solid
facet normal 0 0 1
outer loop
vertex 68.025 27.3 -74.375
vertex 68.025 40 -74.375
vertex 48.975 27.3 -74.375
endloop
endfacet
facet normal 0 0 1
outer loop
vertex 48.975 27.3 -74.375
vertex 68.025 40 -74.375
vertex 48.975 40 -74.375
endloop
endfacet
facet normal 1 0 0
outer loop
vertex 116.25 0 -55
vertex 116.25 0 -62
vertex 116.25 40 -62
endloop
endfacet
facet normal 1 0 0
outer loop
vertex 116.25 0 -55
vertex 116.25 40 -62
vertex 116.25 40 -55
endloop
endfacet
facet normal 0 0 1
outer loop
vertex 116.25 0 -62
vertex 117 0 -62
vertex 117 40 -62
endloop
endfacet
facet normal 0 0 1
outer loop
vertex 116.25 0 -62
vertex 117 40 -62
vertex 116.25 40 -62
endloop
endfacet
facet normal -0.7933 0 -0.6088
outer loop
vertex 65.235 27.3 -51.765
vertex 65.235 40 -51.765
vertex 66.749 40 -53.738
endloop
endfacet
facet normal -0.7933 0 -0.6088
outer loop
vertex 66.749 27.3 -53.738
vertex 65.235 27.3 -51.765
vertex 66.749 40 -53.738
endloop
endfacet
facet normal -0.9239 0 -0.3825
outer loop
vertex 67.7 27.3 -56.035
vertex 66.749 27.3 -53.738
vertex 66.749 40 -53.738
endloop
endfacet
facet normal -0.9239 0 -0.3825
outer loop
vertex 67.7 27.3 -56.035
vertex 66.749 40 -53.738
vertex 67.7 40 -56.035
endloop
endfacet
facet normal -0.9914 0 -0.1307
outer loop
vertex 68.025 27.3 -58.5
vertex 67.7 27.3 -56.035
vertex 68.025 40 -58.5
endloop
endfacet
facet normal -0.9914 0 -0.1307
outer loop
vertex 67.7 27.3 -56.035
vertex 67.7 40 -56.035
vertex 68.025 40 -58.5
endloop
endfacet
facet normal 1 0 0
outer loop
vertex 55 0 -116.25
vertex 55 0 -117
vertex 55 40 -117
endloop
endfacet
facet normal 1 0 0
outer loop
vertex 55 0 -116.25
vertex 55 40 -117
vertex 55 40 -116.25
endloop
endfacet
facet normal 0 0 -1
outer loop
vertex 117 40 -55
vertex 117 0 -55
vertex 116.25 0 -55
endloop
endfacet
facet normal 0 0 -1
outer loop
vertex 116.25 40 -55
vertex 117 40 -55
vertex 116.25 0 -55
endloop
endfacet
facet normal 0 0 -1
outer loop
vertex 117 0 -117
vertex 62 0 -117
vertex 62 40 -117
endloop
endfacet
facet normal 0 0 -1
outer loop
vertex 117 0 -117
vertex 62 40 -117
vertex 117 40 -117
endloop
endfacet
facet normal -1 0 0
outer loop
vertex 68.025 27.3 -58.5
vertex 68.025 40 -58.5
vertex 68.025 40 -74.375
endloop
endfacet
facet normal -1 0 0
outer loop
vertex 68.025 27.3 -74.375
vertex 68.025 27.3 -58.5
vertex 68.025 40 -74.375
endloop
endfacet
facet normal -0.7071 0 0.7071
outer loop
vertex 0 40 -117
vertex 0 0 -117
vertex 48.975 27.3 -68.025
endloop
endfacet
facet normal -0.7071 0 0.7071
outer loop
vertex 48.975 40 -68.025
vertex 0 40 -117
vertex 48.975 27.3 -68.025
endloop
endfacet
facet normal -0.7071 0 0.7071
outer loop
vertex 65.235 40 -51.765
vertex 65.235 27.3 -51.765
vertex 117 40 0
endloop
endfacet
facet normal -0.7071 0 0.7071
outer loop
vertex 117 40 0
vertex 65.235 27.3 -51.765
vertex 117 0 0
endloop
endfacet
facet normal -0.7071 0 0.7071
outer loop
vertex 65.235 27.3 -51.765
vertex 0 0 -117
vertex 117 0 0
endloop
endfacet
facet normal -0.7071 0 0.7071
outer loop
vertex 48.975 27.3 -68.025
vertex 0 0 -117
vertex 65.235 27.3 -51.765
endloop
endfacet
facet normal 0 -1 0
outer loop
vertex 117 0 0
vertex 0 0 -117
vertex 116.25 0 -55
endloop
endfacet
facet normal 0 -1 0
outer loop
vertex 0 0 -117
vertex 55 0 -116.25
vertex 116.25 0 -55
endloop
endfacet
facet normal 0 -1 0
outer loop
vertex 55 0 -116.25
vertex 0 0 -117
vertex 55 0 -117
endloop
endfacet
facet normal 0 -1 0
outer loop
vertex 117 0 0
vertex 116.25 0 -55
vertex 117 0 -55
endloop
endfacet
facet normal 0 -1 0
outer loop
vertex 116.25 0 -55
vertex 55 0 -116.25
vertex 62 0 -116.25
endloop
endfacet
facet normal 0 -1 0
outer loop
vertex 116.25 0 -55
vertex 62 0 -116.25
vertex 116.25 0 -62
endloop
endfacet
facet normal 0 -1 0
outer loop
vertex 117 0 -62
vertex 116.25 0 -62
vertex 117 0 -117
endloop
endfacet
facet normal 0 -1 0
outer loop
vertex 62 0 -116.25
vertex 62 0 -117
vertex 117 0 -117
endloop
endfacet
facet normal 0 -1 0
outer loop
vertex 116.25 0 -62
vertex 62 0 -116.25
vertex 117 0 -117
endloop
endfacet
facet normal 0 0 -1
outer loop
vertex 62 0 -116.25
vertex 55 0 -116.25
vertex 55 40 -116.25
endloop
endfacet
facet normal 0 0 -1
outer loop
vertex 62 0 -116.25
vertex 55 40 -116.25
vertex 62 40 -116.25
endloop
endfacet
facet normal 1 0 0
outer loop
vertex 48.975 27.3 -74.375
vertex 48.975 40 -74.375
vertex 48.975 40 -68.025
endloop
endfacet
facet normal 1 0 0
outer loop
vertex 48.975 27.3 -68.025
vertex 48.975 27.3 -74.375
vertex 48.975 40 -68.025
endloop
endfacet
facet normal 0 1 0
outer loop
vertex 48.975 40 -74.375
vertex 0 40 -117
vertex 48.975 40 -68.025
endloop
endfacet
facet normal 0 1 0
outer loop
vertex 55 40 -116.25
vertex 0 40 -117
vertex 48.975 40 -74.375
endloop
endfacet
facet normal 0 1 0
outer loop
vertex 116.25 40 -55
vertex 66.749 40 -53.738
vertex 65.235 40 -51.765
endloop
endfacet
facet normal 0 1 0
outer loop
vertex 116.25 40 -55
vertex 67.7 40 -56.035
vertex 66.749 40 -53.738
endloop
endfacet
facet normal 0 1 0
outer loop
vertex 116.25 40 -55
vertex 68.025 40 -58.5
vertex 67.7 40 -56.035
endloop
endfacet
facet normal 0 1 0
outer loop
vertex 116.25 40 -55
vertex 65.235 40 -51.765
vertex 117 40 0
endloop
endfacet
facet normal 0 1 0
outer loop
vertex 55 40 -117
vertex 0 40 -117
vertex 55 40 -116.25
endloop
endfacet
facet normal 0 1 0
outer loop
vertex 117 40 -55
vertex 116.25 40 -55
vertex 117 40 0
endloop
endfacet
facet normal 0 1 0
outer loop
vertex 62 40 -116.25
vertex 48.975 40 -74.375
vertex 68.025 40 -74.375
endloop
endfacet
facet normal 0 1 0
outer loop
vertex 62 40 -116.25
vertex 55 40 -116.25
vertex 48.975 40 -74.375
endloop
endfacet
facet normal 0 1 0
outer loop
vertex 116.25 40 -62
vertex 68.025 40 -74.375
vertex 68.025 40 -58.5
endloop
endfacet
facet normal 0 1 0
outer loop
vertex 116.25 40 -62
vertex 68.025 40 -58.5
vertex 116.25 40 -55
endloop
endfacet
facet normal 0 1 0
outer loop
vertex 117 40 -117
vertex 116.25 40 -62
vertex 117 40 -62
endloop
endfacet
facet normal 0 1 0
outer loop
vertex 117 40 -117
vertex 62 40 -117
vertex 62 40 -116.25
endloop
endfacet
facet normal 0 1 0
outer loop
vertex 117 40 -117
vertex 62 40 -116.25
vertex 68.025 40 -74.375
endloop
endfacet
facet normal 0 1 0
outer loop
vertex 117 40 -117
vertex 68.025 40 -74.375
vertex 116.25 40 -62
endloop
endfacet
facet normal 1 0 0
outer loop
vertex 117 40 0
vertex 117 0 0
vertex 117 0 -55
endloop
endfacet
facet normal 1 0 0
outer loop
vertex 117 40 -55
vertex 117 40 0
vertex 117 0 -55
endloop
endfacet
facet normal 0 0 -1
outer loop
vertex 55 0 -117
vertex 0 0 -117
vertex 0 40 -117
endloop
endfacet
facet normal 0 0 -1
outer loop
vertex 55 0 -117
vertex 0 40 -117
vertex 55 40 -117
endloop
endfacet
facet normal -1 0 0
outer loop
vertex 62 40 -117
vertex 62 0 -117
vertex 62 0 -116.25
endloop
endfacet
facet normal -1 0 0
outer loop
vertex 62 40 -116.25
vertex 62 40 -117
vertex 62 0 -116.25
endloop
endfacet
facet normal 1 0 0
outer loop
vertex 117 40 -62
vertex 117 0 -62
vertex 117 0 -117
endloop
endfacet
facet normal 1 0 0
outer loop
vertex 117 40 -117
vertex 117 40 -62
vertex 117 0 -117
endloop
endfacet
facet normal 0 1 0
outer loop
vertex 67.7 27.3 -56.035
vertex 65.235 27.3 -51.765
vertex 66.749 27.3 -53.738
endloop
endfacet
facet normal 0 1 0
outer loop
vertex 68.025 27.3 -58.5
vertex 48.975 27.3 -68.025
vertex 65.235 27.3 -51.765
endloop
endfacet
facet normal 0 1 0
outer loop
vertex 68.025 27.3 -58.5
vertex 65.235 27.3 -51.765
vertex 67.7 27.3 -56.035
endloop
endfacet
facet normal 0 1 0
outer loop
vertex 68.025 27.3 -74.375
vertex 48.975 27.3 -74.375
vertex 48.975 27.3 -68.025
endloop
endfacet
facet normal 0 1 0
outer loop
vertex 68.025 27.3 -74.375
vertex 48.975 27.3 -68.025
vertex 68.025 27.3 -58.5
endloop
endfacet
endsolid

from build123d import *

# Parameters (mm, degrees)
SKETCH1_W           = 117
SKETCH1_H           = 117
BOSS_EXTRUDE1_DEPTH = 40
SKETCH2_W           = 10.53028371
SKETCH2_H           = 7.9375
CUT_EXTRUDE1_DEPTH  = 12.7
SKETCH7_W           = 7
SKETCH7_H           = 1.5
CUT_EXTRUDE5_DEPTH  = 171.22925718
CIRPATTERN3_COUNT   = 3
CIRPATTERN3_ANGLE   = 180
CUT_EXTRUDE12_DEPTH = 171.22925718


with BuildPart() as part:
    # Sketch1 → Boss-Extrude1 (new body)
    with BuildSketch(Plane(origin=(0, 0, 0), x_dir=(1, 0, 0), z_dir=(0, 1, 0))):
        with Locations((58.5, 58.5)):
            Rectangle(SKETCH1_W, SKETCH1_H)
    extrude(amount=BOSS_EXTRUDE1_DEPTH)

    # Sketch2 → Cut-Extrude1 (cut)
    with BuildSketch(Plane(origin=(0, 40, 0), x_dir=(1, 0, 0), z_dir=(0, 1, 0))):
        with BuildLine():
            ThreePointArc((63.765141855, 66.4375), (66.892737967, 63.004173), (68.025, 58.5))
            Line((68.025, 58.5), (68.025, 74.375))
            Line((68.025, 74.375), (48.975, 74.375))
            Line((48.975, 74.375), (48.975, 58.5))
            ThreePointArc((48.975, 58.5), (50.107262033, 63.004173), (53.234858145, 66.4375))
            ThreePointArc((53.234858145, 66.4375), (58.5, 68.025), (63.765141855, 66.4375))
        make_face()
        with BuildLine():
            ThreePointArc((63.765141855, 50.5625), (66.892737967, 53.995827), (68.025, 58.5))
            Line((68.025, 58.5), (63.765141855, 58.5))
            Line((63.765141855, 58.5), (63.765141855, 50.5625))
        make_face()
        with BuildLine():
            Line((63.765141855, 58.5), (68.025, 58.5))
            ThreePointArc((68.025, 58.5), (66.892737967, 63.004173), (63.765141855, 66.4375))
            Line((63.765141855, 66.4375), (63.765141855, 58.5))
        make_face()
        with BuildLine():
            Line((53.234858145, 50.5625), (53.234858145, 58.5))
            Line((53.234858145, 58.5), (48.975, 58.5))
            ThreePointArc((48.975, 58.5), (50.107262033, 53.995827), (53.234858145, 50.5625))
        make_face()
        with BuildLine():
            Line((48.975, 58.5), (53.234858145, 58.5))
            Line((53.234858145, 58.5), (53.234858145, 66.4375))
            ThreePointArc((53.234858145, 66.4375), (50.107262033, 63.004173), (48.975, 58.5))
        make_face()
        with Locations((58.5, 62.46875)):
            Rectangle(SKETCH2_W, SKETCH2_H)
        with BuildLine():
            Line((53.234858145, 66.4375), (63.765141855, 66.4375))
            ThreePointArc((63.765141855, 66.4375), (58.5, 68.025), (53.234858145, 66.4375))
        make_face()
        with BuildLine():
            ThreePointArc((63.765141855, 50.5625), (66.892737967, 53.995827), (68.025, 58.5))
            Line((68.025, 58.5), (63.765141855, 58.5))
            Line((63.765141855, 58.5), (63.765141855, 50.5625))
        make_face()
        with BuildLine():
            Line((63.765141855, 58.5), (68.025, 58.5))
            ThreePointArc((68.025, 58.5), (66.892737967, 63.004173), (63.765141855, 66.4375))
            Line((63.765141855, 66.4375), (63.765141855, 58.5))
        make_face()
        with BuildLine():
            Line((53.234858145, 50.5625), (53.234858145, 58.5))
            Line((53.234858145, 58.5), (48.975, 58.5))
            ThreePointArc((48.975, 58.5), (50.107262033, 53.995827), (53.234858145, 50.5625))
        make_face()
        with BuildLine():
            Line((48.975, 58.5), (53.234858145, 58.5))
            Line((53.234858145, 58.5), (53.234858145, 66.4375))
            ThreePointArc((53.234858145, 66.4375), (50.107262033, 63.004173), (48.975, 58.5))
        make_face()
        with Locations((58.5, 54.53125)):
            Rectangle(SKETCH2_W, SKETCH2_H)
    extrude(amount=-CUT_EXTRUDE1_DEPTH, mode=Mode.SUBTRACT)

    # Sketch7 → Cut-Extrude5 (cut, through all)
    with BuildSketch(Plane.XZ):
        with Locations((58.5, -117)):
            Rectangle(SKETCH7_W, SKETCH7_H)
    cut_extrude5 = extrude(amount=-CUT_EXTRUDE5_DEPTH, mode=Mode.SUBTRACT)

    # CirPattern3: Cut-Extrude5 ×3 about axis
    cirpattern3_axis = Axis((58.5, 0, -58.5), (0, -1, 0))
    for i in range(1, CIRPATTERN3_COUNT):
        add(cut_extrude5.rotate(cirpattern3_axis, i * CIRPATTERN3_ANGLE / (CIRPATTERN3_COUNT - 1)), mode=Mode.SUBTRACT)

    # Sketch11 → Cut-Extrude12 (cut, through all)
    with BuildSketch(Plane.XZ):
        Polygon((0, -117), (117, 0), (54.653996097, 62.346003903), (-62.346003903, -54.653996097), align=None)
    extrude(amount=-CUT_EXTRUDE12_DEPTH, mode=Mode.SUBTRACT)


solid = part.part
